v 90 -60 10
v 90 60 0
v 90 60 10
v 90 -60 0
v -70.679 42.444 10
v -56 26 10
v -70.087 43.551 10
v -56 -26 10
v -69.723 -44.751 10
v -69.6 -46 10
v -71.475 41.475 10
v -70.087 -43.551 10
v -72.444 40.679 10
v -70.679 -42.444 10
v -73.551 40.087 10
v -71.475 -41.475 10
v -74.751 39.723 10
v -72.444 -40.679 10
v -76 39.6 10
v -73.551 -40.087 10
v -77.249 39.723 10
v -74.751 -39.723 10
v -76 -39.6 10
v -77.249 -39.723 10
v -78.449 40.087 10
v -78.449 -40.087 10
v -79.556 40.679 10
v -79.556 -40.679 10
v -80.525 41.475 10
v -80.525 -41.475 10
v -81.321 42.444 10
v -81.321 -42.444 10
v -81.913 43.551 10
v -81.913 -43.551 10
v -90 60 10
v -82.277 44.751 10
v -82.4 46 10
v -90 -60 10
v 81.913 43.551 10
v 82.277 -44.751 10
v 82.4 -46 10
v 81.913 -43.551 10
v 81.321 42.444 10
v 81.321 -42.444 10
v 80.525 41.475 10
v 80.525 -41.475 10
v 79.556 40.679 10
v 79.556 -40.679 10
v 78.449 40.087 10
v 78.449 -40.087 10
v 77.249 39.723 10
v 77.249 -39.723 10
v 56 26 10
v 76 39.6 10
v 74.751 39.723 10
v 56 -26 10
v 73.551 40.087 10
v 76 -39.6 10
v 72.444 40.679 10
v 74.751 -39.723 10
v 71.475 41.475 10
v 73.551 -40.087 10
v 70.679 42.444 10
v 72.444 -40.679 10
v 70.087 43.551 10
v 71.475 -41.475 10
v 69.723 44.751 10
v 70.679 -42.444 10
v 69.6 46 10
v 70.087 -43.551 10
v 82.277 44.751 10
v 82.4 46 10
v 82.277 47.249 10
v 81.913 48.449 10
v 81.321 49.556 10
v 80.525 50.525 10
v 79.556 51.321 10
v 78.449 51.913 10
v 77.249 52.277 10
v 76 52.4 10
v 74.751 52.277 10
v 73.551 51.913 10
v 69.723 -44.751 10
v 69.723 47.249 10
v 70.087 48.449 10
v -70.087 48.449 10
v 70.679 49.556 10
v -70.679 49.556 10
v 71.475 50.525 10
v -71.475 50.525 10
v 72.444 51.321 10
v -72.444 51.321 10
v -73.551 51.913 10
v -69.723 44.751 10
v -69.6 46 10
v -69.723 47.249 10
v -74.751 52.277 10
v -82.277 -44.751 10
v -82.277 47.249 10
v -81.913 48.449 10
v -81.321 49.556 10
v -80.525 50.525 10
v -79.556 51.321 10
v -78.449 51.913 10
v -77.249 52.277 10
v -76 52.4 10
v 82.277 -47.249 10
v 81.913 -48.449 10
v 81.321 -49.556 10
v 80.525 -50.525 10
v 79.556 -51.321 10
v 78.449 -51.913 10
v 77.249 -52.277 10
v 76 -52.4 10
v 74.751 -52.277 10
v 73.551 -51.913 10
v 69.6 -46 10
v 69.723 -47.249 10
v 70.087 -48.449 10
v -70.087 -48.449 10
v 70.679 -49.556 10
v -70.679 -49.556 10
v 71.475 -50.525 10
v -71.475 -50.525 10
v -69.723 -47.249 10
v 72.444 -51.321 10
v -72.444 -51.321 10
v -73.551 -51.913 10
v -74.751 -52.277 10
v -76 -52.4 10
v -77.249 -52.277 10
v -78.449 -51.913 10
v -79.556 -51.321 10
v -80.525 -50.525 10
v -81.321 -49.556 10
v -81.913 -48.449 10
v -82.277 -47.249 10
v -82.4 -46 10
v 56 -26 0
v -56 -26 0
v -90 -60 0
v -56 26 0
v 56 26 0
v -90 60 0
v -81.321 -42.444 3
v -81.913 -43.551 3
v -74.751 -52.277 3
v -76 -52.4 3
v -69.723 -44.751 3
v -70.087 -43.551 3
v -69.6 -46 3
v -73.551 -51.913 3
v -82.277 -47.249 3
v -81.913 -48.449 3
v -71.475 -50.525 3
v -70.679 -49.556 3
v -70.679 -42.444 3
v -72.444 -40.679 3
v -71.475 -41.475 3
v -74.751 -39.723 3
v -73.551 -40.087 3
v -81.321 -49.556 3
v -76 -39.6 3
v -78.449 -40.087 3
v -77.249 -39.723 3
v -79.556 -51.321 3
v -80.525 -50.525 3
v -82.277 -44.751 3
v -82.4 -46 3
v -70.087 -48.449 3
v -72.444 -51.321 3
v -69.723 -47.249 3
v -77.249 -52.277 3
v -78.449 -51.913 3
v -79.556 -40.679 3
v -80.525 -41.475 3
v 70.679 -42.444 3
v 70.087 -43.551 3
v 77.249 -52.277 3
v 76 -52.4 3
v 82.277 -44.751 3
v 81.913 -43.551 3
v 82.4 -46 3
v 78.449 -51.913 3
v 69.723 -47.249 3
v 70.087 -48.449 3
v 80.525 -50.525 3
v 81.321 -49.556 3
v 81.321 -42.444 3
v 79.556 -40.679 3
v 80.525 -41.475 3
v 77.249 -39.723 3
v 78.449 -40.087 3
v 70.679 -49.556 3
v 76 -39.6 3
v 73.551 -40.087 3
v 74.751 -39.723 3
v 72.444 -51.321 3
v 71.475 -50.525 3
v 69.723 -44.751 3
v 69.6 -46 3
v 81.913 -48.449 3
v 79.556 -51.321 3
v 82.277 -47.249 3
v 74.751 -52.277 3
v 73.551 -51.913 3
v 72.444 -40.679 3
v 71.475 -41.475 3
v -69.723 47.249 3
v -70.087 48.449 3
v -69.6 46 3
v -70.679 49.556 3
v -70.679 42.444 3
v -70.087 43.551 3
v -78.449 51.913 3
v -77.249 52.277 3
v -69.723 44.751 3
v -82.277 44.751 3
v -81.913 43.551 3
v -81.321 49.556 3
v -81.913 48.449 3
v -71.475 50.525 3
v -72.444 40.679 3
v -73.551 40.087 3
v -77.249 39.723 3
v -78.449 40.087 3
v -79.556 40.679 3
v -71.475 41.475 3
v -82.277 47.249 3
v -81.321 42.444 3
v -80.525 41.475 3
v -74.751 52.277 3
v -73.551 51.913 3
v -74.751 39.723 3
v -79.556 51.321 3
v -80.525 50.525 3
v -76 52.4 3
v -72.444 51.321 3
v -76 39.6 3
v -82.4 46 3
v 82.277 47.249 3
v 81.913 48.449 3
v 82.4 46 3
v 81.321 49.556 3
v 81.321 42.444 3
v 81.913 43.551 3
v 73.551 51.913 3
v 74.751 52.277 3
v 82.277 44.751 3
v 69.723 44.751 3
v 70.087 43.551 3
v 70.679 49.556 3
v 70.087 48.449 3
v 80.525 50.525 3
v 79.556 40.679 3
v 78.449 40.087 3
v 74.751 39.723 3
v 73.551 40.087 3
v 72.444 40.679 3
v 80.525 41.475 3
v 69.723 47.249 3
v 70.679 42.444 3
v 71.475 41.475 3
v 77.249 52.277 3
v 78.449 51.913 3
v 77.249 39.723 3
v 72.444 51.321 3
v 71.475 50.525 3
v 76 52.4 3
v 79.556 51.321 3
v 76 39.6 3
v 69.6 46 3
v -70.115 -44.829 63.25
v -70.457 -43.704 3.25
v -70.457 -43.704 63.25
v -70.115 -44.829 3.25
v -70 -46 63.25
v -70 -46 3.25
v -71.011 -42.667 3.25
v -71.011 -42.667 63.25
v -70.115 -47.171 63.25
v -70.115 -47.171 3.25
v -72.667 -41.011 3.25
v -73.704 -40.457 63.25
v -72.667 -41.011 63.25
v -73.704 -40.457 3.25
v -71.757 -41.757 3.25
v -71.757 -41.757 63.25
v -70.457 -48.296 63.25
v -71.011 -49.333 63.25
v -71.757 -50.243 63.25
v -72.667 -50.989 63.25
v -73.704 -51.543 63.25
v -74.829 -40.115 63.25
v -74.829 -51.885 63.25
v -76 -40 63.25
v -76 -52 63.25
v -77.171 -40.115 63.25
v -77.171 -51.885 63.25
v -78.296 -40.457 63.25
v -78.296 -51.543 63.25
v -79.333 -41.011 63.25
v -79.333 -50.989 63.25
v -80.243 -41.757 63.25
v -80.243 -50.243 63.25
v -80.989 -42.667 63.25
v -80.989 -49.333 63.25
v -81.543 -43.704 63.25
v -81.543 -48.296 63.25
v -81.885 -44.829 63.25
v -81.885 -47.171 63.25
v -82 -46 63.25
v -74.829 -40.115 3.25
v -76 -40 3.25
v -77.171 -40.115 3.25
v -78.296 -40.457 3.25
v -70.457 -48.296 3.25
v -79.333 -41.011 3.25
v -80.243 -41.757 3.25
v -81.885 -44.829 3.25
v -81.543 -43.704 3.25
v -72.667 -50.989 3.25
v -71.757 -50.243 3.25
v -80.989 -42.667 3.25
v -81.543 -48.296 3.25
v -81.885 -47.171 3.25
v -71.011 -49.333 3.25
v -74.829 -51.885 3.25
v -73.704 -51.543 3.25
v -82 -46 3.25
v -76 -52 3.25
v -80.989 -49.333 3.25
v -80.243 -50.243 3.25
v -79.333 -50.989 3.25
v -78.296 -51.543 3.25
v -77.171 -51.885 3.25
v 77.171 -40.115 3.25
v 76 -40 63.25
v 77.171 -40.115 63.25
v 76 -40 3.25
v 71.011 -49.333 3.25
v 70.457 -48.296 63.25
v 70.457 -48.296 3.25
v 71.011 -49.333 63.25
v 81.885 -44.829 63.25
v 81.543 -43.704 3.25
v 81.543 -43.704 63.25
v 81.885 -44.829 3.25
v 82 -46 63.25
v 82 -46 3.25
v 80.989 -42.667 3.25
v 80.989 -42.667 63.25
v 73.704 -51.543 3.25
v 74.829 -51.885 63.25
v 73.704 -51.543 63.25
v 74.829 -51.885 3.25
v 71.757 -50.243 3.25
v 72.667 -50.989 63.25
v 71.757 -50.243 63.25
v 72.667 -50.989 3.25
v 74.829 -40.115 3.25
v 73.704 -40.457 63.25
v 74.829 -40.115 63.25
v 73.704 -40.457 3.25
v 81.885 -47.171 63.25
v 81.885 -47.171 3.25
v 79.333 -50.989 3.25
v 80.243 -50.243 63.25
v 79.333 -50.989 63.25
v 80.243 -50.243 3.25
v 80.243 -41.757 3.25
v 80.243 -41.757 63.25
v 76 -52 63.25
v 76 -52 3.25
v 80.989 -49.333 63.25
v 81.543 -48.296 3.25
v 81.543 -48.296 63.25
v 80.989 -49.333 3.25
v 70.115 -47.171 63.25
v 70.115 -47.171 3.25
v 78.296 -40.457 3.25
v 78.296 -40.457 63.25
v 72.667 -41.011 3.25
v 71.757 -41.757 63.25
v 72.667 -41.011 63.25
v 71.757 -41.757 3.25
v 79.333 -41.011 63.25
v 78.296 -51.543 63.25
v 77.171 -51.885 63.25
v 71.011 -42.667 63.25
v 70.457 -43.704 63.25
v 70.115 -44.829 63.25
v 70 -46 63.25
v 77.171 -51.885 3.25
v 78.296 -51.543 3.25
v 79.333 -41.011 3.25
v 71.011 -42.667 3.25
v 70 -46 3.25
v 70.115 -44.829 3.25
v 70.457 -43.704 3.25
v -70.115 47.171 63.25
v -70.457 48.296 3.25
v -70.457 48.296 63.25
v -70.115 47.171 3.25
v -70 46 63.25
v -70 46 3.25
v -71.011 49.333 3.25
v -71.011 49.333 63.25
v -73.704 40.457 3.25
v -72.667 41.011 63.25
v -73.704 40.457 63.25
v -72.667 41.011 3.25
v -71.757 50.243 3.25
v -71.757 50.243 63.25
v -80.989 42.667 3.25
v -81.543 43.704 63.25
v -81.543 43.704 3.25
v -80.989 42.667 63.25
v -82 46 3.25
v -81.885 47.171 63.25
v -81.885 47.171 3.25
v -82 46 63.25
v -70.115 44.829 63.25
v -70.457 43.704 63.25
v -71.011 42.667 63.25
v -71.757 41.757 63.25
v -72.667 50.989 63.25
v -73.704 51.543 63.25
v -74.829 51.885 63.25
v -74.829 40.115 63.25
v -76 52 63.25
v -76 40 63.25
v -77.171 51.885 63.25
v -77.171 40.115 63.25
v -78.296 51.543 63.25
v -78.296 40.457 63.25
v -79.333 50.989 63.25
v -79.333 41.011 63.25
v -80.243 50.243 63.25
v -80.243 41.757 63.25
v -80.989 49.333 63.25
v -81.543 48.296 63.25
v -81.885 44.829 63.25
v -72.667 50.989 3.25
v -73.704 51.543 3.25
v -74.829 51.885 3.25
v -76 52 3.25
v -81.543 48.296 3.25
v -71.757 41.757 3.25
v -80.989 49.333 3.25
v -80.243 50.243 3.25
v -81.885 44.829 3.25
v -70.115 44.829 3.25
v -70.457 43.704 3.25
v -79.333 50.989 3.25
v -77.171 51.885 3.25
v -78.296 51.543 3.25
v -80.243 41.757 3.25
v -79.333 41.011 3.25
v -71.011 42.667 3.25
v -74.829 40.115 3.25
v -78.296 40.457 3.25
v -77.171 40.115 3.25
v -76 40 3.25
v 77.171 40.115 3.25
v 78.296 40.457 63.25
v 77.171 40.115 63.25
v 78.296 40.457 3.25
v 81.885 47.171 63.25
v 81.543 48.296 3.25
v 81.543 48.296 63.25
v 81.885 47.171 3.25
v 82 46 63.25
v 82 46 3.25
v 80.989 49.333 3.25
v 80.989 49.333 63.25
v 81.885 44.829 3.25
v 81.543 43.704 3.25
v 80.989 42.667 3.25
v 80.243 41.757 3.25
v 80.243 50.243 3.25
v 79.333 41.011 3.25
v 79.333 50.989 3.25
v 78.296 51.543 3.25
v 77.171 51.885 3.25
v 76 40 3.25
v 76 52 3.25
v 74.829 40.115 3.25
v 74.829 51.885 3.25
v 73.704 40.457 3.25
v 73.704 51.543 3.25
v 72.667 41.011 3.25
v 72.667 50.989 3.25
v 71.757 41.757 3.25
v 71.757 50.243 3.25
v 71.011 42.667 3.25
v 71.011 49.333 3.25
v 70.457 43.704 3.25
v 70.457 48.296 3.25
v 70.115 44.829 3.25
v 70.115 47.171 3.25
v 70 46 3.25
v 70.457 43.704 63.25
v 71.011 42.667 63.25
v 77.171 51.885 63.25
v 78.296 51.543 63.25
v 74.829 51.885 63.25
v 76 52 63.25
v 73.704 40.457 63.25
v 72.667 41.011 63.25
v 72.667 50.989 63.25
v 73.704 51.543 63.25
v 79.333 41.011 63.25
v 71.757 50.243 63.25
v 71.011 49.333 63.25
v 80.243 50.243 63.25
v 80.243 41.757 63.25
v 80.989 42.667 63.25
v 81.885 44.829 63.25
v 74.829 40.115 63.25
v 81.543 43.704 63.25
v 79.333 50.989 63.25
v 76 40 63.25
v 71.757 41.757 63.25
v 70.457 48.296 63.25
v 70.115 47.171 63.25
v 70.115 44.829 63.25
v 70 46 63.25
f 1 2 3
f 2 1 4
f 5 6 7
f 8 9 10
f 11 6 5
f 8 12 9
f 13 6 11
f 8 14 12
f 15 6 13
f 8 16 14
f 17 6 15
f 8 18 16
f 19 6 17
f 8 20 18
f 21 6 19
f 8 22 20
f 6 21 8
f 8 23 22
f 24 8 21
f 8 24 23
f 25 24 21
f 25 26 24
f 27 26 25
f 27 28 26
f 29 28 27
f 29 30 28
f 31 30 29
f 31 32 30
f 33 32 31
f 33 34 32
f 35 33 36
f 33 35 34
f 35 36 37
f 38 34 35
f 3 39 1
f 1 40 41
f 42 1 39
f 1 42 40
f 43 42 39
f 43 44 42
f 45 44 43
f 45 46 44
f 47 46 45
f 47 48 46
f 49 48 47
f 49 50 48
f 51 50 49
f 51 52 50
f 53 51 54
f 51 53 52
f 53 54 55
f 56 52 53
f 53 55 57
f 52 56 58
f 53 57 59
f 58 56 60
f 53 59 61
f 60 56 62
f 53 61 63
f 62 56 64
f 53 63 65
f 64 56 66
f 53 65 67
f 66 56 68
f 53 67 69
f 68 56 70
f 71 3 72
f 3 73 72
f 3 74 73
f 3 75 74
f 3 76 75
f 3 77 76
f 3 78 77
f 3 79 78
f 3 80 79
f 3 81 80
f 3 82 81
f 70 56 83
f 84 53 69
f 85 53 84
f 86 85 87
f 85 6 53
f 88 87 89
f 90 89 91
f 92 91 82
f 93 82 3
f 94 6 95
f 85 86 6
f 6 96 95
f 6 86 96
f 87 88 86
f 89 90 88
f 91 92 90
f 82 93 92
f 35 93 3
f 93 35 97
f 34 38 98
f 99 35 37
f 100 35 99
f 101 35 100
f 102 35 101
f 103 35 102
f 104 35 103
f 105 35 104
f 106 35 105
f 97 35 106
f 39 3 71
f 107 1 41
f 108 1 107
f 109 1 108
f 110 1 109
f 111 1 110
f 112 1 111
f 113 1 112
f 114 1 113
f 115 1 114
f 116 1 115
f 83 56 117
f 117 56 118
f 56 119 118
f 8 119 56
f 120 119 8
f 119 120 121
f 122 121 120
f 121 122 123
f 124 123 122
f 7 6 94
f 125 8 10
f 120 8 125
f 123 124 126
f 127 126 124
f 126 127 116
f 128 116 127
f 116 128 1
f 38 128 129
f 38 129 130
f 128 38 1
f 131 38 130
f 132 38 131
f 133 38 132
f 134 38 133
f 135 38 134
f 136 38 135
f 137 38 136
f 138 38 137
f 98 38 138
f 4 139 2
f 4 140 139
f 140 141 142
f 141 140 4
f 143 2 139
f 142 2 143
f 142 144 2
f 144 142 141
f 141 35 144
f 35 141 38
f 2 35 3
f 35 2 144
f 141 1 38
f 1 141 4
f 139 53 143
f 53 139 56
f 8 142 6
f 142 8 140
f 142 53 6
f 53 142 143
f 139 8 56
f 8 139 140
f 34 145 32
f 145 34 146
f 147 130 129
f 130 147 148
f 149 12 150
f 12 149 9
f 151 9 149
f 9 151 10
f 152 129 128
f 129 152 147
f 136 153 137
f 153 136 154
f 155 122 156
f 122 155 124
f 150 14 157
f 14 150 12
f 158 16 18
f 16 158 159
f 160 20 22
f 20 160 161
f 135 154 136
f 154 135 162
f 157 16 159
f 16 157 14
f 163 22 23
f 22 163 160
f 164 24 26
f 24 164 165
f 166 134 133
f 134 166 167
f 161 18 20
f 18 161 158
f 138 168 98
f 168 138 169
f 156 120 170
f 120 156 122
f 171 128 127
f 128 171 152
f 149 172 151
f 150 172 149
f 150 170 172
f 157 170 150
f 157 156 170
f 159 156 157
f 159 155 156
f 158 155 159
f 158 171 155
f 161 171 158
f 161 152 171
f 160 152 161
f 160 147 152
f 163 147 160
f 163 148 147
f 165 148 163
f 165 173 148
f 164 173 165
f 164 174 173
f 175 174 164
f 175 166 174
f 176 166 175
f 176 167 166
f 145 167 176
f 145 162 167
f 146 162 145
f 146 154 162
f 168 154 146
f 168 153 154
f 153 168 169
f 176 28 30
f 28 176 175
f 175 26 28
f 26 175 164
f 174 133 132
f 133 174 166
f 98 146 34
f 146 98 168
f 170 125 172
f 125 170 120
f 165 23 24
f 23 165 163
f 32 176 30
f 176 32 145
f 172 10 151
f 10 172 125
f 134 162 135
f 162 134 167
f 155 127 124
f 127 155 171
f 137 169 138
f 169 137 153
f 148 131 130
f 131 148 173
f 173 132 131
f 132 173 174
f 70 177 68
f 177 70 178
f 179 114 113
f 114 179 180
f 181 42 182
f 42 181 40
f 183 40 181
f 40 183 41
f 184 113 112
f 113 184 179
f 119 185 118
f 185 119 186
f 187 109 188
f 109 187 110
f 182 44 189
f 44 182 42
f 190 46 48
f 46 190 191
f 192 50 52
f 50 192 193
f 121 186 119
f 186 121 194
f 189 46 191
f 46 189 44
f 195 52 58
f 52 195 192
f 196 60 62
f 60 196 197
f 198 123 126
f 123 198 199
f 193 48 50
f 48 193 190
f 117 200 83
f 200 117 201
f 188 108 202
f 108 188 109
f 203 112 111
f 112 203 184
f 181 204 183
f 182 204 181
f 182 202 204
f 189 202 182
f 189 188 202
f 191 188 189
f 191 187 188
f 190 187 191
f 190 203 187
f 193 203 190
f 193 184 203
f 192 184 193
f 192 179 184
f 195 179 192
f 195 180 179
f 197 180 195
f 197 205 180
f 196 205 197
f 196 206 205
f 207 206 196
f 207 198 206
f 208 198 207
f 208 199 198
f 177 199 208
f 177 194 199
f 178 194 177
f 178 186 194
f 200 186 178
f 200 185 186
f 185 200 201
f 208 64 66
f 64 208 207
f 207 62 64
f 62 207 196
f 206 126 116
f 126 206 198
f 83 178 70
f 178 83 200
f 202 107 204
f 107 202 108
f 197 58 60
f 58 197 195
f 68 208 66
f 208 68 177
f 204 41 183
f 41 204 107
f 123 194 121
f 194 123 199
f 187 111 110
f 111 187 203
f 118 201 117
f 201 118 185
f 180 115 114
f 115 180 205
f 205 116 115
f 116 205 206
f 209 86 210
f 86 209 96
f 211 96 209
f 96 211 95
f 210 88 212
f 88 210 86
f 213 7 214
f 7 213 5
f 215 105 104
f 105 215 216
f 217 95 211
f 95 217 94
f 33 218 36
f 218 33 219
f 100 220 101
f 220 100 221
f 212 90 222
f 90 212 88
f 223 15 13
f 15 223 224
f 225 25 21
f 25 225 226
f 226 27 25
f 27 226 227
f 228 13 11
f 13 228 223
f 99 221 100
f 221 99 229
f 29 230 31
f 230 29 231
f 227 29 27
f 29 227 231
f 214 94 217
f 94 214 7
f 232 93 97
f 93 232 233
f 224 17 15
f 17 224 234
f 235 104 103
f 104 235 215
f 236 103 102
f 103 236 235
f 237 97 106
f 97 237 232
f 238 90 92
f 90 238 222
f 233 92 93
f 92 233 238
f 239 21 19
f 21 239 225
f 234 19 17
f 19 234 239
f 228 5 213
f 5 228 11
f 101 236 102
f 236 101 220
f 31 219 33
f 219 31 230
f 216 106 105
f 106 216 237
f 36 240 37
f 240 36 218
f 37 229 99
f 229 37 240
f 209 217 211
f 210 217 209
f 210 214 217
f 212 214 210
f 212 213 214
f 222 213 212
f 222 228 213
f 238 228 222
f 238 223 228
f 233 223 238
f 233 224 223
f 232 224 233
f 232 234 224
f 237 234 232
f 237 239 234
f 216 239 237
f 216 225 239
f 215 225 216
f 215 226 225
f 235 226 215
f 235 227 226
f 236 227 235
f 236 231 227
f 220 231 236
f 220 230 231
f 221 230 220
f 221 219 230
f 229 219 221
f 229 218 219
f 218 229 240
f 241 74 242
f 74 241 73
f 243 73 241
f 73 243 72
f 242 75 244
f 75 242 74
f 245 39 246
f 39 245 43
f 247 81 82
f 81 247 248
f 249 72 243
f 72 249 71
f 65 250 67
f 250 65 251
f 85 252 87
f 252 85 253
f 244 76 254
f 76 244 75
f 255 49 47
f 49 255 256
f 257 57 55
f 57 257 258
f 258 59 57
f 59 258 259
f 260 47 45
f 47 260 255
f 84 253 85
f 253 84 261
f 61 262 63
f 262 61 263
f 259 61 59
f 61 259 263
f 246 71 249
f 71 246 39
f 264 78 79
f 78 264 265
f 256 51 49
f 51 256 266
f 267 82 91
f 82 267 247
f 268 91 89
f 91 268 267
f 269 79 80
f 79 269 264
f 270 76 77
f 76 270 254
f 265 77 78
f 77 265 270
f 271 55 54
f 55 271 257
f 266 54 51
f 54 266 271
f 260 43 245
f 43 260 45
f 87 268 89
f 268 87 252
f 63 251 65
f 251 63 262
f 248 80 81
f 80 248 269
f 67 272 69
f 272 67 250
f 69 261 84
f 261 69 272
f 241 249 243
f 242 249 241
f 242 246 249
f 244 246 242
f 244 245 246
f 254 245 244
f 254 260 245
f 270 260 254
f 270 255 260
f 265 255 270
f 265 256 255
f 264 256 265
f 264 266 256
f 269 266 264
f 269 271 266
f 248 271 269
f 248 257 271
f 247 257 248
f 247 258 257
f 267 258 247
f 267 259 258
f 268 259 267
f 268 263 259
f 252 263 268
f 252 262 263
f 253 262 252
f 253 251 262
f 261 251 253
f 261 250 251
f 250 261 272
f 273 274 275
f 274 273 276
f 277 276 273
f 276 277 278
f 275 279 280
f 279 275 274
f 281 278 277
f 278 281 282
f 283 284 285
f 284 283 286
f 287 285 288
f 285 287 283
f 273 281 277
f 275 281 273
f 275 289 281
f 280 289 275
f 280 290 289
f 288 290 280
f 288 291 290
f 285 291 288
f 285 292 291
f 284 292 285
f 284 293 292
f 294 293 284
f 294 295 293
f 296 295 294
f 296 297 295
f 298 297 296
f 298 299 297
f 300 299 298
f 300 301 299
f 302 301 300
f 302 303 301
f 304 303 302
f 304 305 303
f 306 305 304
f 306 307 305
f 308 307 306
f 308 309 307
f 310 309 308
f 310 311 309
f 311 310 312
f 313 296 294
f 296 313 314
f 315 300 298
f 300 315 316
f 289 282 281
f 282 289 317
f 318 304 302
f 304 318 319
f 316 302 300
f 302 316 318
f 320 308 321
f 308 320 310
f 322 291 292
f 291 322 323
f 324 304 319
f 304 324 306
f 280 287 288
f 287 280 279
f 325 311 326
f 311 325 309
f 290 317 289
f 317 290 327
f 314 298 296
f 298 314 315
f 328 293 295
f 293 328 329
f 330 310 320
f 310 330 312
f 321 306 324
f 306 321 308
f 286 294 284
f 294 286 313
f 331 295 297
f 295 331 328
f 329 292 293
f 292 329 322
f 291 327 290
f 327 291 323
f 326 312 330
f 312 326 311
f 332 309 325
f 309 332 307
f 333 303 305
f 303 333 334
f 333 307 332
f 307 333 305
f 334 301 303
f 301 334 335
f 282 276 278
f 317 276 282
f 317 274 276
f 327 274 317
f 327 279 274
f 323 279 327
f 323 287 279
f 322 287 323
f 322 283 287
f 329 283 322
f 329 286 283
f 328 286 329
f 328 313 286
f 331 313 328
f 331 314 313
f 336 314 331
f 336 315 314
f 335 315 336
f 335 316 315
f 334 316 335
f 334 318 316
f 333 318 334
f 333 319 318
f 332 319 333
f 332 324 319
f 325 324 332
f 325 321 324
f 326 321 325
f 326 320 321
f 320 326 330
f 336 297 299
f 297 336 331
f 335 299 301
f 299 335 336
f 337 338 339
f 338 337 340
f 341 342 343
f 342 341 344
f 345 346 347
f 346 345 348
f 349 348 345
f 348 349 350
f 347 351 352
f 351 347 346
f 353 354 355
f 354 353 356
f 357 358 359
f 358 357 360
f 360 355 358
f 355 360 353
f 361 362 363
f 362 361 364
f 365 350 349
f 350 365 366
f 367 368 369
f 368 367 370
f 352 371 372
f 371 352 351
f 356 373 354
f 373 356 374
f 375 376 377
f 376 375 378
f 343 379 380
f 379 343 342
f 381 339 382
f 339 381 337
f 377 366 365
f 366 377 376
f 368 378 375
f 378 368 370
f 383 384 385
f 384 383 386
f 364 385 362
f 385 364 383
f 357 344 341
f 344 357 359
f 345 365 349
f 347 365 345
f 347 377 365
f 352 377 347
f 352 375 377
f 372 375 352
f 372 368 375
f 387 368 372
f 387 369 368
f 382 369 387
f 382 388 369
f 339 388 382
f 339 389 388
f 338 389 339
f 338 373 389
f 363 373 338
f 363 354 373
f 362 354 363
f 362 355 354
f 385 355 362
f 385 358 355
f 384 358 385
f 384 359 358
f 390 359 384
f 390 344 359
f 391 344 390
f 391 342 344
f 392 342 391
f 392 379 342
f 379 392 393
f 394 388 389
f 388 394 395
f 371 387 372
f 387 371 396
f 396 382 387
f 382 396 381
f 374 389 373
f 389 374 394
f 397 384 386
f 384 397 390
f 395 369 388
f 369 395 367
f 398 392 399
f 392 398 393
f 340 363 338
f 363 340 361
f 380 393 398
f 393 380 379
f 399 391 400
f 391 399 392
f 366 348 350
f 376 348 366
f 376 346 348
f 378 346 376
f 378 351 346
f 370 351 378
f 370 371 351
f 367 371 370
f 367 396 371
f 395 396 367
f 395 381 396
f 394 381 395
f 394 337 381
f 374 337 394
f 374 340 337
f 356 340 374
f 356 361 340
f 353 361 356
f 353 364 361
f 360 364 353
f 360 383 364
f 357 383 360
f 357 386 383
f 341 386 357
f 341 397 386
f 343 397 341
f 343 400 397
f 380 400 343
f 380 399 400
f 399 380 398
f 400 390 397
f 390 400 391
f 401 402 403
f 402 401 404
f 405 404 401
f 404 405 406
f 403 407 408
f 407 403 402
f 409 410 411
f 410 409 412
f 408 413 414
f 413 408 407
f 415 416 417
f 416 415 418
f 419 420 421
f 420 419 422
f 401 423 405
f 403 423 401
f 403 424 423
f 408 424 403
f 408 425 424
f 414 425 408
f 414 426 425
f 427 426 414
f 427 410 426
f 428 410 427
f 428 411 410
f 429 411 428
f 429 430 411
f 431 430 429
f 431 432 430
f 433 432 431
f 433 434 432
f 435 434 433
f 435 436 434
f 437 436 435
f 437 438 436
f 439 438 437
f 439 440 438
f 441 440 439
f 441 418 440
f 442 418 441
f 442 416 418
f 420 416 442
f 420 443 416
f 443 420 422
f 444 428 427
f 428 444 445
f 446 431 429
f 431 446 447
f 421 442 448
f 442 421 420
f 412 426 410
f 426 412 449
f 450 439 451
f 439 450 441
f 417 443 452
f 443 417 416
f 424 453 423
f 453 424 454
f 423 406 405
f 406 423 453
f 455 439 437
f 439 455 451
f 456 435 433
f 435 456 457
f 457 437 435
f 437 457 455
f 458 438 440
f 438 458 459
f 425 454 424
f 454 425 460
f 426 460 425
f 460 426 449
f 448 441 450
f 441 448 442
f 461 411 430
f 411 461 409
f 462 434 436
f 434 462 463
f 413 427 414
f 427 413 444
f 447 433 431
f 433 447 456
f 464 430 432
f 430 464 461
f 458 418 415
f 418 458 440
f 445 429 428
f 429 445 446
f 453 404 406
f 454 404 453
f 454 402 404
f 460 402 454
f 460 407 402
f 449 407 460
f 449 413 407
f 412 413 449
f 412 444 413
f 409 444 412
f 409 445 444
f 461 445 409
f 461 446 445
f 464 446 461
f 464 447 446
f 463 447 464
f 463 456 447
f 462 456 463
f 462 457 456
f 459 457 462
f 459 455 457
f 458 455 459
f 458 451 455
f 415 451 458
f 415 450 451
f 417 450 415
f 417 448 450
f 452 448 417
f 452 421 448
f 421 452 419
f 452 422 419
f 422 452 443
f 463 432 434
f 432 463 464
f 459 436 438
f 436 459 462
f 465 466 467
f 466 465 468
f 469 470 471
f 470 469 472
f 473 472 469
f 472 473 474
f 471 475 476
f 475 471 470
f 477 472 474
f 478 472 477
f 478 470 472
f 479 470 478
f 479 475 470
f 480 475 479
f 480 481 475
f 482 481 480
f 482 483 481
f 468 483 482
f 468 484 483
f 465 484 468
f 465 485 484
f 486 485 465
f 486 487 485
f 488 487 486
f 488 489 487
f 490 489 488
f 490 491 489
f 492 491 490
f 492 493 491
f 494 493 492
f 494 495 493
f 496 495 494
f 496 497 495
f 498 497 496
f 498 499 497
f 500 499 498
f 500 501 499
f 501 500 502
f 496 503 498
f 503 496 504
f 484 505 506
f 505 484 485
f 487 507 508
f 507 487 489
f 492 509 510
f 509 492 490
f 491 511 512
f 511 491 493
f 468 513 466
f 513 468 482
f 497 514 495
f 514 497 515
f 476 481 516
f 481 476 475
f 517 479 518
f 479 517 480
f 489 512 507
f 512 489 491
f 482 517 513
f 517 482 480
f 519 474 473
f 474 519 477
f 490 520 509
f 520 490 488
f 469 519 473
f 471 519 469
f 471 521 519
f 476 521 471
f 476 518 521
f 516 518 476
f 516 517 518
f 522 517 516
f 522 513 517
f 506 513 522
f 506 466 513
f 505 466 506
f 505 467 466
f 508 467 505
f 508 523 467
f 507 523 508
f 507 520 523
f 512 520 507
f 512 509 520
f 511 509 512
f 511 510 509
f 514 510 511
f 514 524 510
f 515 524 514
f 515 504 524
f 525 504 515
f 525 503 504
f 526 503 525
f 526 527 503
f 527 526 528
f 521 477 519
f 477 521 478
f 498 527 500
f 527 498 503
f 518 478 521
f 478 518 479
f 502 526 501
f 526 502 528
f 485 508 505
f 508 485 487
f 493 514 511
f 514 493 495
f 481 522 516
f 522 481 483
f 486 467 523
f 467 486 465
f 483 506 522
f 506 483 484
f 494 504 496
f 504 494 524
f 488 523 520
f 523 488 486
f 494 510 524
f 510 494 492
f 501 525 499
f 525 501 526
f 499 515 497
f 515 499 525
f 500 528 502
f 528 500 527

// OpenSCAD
$fn = 32;

// ------------------------------------------------------------------------
// Frame with four posts: 180 x 120 mm frame, four d12 posts
// Every part is its own module, assembly() places them once.
// ------------------------------------------------------------------------

// --- part 1 ---
module base_frame() {
  difference() {
    translate([-90, -60, 0]) cube([180, 120, 10]);
    translate([-56, -26, -1]) cube([112, 52, 12]);
    translate([-76, -46, 3]) cylinder(h = 8, d = 12.8);
    translate([76, -46, 3]) cylinder(h = 8, d = 12.8);
    translate([-76, 46, 3]) cylinder(h = 8, d = 12.8);
    translate([76, 46, 3]) cylinder(h = 8, d = 12.8);
  }
}

// --- part 2 ---
module post1() {
  cylinder(h = 60, d = 12);
}

// --- part 3 ---
module post2() {
  cylinder(h = 60, d = 12);
}

// --- part 4 ---
module post3() {
  cylinder(h = 60, d = 12);
}

// --- part 5 ---
module post4() {
  cylinder(h = 60, d = 12);
}

// --- assembly ---
module assembly() {
  translate([0, 0, 0]) rotate([0, 0, 0]) base_frame();
  translate([-76, -46, 3.25]) rotate([0, 0, 0]) post1();
  translate([76, -46, 3.25]) rotate([0, 0, 0]) post2();
  translate([-76, 46, 3.25]) rotate([0, 0, 0]) post3();
  translate([76, 46, 3.25]) rotate([0, 0, 0]) post4();
}

assembly();
